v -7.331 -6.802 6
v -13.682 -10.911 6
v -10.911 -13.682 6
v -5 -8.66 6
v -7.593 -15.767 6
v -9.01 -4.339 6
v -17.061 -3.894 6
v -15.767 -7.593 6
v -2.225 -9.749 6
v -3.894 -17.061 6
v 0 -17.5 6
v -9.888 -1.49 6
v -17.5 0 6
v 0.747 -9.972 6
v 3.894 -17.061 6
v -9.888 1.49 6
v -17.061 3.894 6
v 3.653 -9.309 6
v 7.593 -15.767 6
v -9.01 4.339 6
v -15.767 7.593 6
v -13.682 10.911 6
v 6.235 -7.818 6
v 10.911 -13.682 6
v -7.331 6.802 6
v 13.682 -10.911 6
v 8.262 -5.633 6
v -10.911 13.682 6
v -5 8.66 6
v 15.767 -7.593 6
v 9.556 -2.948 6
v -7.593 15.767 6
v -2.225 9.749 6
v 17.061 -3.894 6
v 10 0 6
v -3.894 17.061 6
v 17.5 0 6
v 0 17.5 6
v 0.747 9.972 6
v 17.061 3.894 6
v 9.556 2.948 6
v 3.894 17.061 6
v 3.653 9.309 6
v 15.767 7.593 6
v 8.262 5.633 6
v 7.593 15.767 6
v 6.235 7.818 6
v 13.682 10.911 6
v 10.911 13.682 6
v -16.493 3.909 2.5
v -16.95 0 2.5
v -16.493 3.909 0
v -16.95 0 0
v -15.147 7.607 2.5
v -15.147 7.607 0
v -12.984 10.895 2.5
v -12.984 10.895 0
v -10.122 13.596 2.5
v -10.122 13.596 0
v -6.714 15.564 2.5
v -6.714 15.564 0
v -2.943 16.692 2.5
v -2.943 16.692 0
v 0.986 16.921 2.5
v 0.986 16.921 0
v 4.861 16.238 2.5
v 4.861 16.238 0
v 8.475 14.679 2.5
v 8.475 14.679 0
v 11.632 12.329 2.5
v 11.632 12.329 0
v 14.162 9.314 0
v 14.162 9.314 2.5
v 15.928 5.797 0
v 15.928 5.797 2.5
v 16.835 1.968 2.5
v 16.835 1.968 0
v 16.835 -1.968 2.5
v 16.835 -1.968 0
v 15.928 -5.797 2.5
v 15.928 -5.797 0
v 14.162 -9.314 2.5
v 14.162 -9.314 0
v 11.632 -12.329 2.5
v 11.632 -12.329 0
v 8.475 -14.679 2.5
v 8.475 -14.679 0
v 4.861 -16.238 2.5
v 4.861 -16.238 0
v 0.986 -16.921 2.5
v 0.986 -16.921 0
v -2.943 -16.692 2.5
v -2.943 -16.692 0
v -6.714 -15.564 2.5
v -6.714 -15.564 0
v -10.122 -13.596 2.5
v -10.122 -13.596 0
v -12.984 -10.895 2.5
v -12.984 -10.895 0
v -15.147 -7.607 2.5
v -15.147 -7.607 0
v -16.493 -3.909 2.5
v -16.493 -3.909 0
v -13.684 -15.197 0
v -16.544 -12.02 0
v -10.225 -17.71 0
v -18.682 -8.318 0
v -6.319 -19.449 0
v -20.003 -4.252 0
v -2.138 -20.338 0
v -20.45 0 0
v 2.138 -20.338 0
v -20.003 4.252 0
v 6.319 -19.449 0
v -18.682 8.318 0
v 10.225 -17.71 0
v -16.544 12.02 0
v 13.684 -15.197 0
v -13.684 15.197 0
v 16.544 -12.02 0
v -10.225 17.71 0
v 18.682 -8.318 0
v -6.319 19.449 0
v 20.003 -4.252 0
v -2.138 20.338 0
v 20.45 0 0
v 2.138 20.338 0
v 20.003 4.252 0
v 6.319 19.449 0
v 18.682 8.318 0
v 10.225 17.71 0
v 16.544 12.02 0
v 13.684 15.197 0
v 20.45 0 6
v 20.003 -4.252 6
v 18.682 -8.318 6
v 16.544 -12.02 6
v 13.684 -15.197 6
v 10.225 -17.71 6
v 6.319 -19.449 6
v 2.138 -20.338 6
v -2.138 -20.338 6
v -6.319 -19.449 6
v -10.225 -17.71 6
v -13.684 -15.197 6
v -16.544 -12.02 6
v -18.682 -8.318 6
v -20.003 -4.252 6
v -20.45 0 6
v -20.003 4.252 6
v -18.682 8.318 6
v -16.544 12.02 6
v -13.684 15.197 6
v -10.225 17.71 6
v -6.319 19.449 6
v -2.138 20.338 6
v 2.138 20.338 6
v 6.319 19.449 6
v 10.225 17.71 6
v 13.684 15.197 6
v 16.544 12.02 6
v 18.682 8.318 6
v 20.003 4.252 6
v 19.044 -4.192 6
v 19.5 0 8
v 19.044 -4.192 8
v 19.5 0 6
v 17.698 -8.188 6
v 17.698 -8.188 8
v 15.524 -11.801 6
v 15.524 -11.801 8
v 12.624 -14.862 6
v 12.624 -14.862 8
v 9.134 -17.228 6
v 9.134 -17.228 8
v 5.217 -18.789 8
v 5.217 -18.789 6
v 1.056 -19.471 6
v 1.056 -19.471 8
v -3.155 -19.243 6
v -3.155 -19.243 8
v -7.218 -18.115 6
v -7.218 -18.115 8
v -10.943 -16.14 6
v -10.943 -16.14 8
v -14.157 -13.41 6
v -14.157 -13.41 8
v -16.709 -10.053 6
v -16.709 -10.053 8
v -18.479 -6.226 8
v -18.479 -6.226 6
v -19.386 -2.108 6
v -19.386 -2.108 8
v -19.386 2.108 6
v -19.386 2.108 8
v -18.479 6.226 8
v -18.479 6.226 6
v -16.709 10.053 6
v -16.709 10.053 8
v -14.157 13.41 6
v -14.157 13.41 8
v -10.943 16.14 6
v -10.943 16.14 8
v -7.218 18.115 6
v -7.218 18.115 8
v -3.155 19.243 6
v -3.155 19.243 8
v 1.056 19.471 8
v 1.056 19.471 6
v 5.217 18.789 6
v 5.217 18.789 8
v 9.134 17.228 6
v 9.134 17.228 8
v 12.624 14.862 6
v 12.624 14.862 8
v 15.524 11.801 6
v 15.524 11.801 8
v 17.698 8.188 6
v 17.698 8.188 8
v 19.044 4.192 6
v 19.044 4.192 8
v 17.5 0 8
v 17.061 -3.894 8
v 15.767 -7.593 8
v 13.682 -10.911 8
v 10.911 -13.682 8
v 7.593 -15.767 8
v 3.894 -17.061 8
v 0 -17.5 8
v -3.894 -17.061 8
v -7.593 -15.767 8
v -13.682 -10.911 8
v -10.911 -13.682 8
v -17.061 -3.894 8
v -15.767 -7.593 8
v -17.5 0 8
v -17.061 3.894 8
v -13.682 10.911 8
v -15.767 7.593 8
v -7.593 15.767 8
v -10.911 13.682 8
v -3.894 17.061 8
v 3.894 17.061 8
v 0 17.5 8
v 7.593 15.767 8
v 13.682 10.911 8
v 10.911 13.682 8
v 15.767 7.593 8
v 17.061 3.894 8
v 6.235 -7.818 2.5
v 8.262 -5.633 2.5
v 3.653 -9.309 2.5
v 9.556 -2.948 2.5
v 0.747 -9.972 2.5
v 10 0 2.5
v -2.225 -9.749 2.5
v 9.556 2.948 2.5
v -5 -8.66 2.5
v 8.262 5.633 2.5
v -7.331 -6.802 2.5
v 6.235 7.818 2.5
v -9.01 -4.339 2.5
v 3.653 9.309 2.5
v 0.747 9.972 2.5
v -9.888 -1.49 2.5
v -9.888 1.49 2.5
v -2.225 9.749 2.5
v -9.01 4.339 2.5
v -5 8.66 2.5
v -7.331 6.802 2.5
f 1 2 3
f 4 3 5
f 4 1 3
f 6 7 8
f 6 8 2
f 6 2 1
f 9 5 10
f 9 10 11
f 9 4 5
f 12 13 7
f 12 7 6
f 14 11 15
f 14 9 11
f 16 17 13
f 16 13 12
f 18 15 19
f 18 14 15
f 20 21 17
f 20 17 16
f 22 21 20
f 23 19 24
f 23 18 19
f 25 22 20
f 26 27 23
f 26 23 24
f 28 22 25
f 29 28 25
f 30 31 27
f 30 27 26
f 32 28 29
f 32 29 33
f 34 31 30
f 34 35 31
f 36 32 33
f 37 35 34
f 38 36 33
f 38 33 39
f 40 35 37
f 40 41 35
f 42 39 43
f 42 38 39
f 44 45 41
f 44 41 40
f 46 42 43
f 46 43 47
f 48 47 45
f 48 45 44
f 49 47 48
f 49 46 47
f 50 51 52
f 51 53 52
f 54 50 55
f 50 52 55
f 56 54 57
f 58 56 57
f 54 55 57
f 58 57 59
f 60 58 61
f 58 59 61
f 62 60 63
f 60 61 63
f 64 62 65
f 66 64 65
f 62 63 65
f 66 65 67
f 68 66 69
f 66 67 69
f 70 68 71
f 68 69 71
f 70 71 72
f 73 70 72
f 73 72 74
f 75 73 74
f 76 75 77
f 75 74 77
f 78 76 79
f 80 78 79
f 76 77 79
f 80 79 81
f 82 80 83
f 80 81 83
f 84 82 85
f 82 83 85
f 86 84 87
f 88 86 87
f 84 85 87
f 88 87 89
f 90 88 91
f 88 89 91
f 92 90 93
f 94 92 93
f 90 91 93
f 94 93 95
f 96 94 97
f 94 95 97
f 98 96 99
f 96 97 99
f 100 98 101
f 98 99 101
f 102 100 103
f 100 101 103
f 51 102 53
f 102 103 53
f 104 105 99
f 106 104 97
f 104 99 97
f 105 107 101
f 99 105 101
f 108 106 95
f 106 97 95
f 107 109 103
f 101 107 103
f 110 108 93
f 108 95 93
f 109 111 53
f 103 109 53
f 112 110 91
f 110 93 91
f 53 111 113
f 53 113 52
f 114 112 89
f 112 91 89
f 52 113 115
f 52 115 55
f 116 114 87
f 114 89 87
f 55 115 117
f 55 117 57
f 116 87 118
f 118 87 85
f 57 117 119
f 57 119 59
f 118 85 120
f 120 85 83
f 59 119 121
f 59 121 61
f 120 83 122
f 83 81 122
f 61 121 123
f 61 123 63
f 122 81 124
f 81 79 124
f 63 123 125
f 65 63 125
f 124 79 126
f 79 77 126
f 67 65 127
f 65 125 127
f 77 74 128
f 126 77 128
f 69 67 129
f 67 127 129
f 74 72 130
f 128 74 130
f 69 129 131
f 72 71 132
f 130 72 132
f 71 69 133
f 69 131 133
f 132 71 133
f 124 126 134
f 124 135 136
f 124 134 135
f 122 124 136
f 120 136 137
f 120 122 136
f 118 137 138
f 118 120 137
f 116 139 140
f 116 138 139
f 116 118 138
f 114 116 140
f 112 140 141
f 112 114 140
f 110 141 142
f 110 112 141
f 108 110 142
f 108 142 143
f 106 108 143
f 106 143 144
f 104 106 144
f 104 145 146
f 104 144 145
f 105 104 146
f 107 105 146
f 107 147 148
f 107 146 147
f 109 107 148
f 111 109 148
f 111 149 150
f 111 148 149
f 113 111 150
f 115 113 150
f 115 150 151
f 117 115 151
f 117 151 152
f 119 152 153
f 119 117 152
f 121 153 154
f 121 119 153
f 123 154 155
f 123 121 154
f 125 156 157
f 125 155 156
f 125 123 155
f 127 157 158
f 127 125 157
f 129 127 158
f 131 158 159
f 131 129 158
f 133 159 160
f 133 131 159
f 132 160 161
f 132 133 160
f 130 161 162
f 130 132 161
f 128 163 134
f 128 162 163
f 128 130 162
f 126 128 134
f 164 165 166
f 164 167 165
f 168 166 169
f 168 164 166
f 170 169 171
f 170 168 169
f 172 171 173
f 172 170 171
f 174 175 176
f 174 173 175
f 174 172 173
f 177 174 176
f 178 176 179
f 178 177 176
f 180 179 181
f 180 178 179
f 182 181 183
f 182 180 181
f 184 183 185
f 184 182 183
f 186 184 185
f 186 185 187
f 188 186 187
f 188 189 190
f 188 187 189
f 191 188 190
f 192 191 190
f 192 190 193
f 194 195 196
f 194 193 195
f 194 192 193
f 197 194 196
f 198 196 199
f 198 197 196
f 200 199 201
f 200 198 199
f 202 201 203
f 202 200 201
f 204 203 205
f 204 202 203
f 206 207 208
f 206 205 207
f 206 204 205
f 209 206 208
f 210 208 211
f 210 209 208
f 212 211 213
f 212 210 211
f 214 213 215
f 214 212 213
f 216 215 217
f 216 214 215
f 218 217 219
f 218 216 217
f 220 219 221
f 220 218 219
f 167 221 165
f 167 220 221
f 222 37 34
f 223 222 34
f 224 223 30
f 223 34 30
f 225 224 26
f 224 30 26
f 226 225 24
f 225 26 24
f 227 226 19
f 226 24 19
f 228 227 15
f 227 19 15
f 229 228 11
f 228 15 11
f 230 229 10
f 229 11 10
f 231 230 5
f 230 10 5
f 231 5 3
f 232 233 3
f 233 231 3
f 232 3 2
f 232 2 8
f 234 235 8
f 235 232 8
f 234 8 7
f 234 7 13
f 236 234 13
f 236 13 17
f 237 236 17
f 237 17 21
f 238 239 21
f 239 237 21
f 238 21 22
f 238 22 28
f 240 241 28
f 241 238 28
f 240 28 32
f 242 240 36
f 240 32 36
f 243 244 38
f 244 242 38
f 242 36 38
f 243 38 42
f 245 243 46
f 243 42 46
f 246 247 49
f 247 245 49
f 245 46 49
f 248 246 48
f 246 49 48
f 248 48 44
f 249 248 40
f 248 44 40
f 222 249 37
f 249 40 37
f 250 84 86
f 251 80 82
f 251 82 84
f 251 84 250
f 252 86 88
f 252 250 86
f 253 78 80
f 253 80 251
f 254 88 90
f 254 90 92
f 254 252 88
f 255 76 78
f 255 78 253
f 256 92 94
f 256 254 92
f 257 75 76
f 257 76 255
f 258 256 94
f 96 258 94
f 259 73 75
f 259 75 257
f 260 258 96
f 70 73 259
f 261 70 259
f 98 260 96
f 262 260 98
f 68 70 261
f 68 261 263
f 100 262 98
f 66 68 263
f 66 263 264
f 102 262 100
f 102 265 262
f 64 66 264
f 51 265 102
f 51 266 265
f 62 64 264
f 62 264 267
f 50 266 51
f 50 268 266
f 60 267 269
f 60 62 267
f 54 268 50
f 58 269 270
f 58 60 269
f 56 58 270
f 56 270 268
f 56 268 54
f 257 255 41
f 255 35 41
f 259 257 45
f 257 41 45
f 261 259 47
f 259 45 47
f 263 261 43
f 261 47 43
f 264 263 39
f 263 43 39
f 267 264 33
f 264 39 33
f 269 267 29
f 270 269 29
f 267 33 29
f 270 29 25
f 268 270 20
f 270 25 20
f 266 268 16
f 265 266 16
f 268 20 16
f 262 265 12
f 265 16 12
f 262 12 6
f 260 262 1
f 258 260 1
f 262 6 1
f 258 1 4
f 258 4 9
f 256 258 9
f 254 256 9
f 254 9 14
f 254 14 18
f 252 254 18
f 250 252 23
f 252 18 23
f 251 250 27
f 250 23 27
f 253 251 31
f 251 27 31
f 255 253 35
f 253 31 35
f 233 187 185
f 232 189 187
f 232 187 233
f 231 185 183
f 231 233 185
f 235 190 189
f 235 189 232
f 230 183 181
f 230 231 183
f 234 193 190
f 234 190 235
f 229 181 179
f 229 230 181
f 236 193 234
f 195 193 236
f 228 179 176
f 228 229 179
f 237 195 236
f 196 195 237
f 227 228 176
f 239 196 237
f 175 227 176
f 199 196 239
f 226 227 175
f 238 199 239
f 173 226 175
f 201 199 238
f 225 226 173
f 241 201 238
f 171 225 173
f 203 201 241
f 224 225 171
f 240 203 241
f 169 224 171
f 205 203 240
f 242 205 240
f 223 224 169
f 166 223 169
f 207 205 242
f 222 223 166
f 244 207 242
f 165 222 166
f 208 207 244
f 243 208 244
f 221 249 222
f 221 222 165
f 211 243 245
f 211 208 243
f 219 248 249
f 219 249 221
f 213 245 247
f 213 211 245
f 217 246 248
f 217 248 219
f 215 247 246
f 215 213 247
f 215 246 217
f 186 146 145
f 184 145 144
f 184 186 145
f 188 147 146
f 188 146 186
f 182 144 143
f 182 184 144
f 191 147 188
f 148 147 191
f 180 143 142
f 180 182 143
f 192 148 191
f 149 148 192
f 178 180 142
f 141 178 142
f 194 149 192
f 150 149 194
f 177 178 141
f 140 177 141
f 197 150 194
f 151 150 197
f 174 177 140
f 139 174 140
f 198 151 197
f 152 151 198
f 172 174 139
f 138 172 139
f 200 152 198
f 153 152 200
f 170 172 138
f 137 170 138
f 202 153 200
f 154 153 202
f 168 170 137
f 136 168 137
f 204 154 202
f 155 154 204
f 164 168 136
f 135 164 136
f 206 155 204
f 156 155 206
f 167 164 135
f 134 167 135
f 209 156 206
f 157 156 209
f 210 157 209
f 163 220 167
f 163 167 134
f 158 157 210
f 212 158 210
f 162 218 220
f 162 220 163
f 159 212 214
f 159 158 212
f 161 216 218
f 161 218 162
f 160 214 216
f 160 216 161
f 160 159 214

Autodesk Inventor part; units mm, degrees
ref_plane "YZ Plane" through (0, 0, 0) normal (1, 0, 0) x (0, 1, 0)
ref_plane "XZ Plane" through (0, 0, 0) normal (0, 1, 0) x (-1, 0, 0)
ref_plane "XY Plane" through (0, 0, 0) normal (0, 0, 1) x (1, 0, 0)
sketch "Эскиз1" plane through (0, 0, 0) normal (0, 0, 1) x (1, 0, 0)
  line L0 (5.5, -5.5) -> (-5.5, -5.5)
  line L1 (-5.5, -5.5) -> (-5.5, 5.5)
  line L2 (-5.5, 5.5) -> (5.5, 5.5)
  line L3 (5.5, 5.5) -> (5.5, -5.5)
  line L4 (5.5, -5.5) -> (-5.5, 5.5) construction
  line L5 (-5.5, -5.5) -> (5.5, 5.5) construction
  circle A0 centre (0, 0) radius 20.45
  circle A1 centre (0, 0) radius 17.5
  dimension "d0" = 11
  dimension "d1" = 11
  dimension "d2" = 40.9
  dimension "d3" = 35
extrude "Выдавливание1" add sketch "Эскиз1" along normal blind 6 contours A0 | A1
sketch "Эскиз2" plane through (0, 0, 6) normal (0, 0, 1) x (1, 0, 0)
  circle A0 centre (0, 0) radius 19.5
  circle A1 centre (0, 0) radius 17.5
  dimension "d6" = 39
  dimension "d7" = 35
extrude "Выдавливание2" add sketch "Эскиз2" along normal blind 2
sketch "Эскиз3" plane through (0, 0, 0) normal (0, 0, -1) x (-1, 0, 0)
  circle A0 centre (0, 0) radius 16.95
  dimension "d10" = 33.9
extrude "Выдавливание3" cut sketch "Эскиз3" against normal blind 2.5
sketch "Эскиз4" plane through (0, 0, 6) normal (0, 0, 1) x (1, 0, 0)
  circle A0 centre (0, 0) radius 10
  dimension "d13" = 20
extrude "Выдавливание4" cut sketch "Эскиз4" against normal blind 10
properties part number "64t2018"
